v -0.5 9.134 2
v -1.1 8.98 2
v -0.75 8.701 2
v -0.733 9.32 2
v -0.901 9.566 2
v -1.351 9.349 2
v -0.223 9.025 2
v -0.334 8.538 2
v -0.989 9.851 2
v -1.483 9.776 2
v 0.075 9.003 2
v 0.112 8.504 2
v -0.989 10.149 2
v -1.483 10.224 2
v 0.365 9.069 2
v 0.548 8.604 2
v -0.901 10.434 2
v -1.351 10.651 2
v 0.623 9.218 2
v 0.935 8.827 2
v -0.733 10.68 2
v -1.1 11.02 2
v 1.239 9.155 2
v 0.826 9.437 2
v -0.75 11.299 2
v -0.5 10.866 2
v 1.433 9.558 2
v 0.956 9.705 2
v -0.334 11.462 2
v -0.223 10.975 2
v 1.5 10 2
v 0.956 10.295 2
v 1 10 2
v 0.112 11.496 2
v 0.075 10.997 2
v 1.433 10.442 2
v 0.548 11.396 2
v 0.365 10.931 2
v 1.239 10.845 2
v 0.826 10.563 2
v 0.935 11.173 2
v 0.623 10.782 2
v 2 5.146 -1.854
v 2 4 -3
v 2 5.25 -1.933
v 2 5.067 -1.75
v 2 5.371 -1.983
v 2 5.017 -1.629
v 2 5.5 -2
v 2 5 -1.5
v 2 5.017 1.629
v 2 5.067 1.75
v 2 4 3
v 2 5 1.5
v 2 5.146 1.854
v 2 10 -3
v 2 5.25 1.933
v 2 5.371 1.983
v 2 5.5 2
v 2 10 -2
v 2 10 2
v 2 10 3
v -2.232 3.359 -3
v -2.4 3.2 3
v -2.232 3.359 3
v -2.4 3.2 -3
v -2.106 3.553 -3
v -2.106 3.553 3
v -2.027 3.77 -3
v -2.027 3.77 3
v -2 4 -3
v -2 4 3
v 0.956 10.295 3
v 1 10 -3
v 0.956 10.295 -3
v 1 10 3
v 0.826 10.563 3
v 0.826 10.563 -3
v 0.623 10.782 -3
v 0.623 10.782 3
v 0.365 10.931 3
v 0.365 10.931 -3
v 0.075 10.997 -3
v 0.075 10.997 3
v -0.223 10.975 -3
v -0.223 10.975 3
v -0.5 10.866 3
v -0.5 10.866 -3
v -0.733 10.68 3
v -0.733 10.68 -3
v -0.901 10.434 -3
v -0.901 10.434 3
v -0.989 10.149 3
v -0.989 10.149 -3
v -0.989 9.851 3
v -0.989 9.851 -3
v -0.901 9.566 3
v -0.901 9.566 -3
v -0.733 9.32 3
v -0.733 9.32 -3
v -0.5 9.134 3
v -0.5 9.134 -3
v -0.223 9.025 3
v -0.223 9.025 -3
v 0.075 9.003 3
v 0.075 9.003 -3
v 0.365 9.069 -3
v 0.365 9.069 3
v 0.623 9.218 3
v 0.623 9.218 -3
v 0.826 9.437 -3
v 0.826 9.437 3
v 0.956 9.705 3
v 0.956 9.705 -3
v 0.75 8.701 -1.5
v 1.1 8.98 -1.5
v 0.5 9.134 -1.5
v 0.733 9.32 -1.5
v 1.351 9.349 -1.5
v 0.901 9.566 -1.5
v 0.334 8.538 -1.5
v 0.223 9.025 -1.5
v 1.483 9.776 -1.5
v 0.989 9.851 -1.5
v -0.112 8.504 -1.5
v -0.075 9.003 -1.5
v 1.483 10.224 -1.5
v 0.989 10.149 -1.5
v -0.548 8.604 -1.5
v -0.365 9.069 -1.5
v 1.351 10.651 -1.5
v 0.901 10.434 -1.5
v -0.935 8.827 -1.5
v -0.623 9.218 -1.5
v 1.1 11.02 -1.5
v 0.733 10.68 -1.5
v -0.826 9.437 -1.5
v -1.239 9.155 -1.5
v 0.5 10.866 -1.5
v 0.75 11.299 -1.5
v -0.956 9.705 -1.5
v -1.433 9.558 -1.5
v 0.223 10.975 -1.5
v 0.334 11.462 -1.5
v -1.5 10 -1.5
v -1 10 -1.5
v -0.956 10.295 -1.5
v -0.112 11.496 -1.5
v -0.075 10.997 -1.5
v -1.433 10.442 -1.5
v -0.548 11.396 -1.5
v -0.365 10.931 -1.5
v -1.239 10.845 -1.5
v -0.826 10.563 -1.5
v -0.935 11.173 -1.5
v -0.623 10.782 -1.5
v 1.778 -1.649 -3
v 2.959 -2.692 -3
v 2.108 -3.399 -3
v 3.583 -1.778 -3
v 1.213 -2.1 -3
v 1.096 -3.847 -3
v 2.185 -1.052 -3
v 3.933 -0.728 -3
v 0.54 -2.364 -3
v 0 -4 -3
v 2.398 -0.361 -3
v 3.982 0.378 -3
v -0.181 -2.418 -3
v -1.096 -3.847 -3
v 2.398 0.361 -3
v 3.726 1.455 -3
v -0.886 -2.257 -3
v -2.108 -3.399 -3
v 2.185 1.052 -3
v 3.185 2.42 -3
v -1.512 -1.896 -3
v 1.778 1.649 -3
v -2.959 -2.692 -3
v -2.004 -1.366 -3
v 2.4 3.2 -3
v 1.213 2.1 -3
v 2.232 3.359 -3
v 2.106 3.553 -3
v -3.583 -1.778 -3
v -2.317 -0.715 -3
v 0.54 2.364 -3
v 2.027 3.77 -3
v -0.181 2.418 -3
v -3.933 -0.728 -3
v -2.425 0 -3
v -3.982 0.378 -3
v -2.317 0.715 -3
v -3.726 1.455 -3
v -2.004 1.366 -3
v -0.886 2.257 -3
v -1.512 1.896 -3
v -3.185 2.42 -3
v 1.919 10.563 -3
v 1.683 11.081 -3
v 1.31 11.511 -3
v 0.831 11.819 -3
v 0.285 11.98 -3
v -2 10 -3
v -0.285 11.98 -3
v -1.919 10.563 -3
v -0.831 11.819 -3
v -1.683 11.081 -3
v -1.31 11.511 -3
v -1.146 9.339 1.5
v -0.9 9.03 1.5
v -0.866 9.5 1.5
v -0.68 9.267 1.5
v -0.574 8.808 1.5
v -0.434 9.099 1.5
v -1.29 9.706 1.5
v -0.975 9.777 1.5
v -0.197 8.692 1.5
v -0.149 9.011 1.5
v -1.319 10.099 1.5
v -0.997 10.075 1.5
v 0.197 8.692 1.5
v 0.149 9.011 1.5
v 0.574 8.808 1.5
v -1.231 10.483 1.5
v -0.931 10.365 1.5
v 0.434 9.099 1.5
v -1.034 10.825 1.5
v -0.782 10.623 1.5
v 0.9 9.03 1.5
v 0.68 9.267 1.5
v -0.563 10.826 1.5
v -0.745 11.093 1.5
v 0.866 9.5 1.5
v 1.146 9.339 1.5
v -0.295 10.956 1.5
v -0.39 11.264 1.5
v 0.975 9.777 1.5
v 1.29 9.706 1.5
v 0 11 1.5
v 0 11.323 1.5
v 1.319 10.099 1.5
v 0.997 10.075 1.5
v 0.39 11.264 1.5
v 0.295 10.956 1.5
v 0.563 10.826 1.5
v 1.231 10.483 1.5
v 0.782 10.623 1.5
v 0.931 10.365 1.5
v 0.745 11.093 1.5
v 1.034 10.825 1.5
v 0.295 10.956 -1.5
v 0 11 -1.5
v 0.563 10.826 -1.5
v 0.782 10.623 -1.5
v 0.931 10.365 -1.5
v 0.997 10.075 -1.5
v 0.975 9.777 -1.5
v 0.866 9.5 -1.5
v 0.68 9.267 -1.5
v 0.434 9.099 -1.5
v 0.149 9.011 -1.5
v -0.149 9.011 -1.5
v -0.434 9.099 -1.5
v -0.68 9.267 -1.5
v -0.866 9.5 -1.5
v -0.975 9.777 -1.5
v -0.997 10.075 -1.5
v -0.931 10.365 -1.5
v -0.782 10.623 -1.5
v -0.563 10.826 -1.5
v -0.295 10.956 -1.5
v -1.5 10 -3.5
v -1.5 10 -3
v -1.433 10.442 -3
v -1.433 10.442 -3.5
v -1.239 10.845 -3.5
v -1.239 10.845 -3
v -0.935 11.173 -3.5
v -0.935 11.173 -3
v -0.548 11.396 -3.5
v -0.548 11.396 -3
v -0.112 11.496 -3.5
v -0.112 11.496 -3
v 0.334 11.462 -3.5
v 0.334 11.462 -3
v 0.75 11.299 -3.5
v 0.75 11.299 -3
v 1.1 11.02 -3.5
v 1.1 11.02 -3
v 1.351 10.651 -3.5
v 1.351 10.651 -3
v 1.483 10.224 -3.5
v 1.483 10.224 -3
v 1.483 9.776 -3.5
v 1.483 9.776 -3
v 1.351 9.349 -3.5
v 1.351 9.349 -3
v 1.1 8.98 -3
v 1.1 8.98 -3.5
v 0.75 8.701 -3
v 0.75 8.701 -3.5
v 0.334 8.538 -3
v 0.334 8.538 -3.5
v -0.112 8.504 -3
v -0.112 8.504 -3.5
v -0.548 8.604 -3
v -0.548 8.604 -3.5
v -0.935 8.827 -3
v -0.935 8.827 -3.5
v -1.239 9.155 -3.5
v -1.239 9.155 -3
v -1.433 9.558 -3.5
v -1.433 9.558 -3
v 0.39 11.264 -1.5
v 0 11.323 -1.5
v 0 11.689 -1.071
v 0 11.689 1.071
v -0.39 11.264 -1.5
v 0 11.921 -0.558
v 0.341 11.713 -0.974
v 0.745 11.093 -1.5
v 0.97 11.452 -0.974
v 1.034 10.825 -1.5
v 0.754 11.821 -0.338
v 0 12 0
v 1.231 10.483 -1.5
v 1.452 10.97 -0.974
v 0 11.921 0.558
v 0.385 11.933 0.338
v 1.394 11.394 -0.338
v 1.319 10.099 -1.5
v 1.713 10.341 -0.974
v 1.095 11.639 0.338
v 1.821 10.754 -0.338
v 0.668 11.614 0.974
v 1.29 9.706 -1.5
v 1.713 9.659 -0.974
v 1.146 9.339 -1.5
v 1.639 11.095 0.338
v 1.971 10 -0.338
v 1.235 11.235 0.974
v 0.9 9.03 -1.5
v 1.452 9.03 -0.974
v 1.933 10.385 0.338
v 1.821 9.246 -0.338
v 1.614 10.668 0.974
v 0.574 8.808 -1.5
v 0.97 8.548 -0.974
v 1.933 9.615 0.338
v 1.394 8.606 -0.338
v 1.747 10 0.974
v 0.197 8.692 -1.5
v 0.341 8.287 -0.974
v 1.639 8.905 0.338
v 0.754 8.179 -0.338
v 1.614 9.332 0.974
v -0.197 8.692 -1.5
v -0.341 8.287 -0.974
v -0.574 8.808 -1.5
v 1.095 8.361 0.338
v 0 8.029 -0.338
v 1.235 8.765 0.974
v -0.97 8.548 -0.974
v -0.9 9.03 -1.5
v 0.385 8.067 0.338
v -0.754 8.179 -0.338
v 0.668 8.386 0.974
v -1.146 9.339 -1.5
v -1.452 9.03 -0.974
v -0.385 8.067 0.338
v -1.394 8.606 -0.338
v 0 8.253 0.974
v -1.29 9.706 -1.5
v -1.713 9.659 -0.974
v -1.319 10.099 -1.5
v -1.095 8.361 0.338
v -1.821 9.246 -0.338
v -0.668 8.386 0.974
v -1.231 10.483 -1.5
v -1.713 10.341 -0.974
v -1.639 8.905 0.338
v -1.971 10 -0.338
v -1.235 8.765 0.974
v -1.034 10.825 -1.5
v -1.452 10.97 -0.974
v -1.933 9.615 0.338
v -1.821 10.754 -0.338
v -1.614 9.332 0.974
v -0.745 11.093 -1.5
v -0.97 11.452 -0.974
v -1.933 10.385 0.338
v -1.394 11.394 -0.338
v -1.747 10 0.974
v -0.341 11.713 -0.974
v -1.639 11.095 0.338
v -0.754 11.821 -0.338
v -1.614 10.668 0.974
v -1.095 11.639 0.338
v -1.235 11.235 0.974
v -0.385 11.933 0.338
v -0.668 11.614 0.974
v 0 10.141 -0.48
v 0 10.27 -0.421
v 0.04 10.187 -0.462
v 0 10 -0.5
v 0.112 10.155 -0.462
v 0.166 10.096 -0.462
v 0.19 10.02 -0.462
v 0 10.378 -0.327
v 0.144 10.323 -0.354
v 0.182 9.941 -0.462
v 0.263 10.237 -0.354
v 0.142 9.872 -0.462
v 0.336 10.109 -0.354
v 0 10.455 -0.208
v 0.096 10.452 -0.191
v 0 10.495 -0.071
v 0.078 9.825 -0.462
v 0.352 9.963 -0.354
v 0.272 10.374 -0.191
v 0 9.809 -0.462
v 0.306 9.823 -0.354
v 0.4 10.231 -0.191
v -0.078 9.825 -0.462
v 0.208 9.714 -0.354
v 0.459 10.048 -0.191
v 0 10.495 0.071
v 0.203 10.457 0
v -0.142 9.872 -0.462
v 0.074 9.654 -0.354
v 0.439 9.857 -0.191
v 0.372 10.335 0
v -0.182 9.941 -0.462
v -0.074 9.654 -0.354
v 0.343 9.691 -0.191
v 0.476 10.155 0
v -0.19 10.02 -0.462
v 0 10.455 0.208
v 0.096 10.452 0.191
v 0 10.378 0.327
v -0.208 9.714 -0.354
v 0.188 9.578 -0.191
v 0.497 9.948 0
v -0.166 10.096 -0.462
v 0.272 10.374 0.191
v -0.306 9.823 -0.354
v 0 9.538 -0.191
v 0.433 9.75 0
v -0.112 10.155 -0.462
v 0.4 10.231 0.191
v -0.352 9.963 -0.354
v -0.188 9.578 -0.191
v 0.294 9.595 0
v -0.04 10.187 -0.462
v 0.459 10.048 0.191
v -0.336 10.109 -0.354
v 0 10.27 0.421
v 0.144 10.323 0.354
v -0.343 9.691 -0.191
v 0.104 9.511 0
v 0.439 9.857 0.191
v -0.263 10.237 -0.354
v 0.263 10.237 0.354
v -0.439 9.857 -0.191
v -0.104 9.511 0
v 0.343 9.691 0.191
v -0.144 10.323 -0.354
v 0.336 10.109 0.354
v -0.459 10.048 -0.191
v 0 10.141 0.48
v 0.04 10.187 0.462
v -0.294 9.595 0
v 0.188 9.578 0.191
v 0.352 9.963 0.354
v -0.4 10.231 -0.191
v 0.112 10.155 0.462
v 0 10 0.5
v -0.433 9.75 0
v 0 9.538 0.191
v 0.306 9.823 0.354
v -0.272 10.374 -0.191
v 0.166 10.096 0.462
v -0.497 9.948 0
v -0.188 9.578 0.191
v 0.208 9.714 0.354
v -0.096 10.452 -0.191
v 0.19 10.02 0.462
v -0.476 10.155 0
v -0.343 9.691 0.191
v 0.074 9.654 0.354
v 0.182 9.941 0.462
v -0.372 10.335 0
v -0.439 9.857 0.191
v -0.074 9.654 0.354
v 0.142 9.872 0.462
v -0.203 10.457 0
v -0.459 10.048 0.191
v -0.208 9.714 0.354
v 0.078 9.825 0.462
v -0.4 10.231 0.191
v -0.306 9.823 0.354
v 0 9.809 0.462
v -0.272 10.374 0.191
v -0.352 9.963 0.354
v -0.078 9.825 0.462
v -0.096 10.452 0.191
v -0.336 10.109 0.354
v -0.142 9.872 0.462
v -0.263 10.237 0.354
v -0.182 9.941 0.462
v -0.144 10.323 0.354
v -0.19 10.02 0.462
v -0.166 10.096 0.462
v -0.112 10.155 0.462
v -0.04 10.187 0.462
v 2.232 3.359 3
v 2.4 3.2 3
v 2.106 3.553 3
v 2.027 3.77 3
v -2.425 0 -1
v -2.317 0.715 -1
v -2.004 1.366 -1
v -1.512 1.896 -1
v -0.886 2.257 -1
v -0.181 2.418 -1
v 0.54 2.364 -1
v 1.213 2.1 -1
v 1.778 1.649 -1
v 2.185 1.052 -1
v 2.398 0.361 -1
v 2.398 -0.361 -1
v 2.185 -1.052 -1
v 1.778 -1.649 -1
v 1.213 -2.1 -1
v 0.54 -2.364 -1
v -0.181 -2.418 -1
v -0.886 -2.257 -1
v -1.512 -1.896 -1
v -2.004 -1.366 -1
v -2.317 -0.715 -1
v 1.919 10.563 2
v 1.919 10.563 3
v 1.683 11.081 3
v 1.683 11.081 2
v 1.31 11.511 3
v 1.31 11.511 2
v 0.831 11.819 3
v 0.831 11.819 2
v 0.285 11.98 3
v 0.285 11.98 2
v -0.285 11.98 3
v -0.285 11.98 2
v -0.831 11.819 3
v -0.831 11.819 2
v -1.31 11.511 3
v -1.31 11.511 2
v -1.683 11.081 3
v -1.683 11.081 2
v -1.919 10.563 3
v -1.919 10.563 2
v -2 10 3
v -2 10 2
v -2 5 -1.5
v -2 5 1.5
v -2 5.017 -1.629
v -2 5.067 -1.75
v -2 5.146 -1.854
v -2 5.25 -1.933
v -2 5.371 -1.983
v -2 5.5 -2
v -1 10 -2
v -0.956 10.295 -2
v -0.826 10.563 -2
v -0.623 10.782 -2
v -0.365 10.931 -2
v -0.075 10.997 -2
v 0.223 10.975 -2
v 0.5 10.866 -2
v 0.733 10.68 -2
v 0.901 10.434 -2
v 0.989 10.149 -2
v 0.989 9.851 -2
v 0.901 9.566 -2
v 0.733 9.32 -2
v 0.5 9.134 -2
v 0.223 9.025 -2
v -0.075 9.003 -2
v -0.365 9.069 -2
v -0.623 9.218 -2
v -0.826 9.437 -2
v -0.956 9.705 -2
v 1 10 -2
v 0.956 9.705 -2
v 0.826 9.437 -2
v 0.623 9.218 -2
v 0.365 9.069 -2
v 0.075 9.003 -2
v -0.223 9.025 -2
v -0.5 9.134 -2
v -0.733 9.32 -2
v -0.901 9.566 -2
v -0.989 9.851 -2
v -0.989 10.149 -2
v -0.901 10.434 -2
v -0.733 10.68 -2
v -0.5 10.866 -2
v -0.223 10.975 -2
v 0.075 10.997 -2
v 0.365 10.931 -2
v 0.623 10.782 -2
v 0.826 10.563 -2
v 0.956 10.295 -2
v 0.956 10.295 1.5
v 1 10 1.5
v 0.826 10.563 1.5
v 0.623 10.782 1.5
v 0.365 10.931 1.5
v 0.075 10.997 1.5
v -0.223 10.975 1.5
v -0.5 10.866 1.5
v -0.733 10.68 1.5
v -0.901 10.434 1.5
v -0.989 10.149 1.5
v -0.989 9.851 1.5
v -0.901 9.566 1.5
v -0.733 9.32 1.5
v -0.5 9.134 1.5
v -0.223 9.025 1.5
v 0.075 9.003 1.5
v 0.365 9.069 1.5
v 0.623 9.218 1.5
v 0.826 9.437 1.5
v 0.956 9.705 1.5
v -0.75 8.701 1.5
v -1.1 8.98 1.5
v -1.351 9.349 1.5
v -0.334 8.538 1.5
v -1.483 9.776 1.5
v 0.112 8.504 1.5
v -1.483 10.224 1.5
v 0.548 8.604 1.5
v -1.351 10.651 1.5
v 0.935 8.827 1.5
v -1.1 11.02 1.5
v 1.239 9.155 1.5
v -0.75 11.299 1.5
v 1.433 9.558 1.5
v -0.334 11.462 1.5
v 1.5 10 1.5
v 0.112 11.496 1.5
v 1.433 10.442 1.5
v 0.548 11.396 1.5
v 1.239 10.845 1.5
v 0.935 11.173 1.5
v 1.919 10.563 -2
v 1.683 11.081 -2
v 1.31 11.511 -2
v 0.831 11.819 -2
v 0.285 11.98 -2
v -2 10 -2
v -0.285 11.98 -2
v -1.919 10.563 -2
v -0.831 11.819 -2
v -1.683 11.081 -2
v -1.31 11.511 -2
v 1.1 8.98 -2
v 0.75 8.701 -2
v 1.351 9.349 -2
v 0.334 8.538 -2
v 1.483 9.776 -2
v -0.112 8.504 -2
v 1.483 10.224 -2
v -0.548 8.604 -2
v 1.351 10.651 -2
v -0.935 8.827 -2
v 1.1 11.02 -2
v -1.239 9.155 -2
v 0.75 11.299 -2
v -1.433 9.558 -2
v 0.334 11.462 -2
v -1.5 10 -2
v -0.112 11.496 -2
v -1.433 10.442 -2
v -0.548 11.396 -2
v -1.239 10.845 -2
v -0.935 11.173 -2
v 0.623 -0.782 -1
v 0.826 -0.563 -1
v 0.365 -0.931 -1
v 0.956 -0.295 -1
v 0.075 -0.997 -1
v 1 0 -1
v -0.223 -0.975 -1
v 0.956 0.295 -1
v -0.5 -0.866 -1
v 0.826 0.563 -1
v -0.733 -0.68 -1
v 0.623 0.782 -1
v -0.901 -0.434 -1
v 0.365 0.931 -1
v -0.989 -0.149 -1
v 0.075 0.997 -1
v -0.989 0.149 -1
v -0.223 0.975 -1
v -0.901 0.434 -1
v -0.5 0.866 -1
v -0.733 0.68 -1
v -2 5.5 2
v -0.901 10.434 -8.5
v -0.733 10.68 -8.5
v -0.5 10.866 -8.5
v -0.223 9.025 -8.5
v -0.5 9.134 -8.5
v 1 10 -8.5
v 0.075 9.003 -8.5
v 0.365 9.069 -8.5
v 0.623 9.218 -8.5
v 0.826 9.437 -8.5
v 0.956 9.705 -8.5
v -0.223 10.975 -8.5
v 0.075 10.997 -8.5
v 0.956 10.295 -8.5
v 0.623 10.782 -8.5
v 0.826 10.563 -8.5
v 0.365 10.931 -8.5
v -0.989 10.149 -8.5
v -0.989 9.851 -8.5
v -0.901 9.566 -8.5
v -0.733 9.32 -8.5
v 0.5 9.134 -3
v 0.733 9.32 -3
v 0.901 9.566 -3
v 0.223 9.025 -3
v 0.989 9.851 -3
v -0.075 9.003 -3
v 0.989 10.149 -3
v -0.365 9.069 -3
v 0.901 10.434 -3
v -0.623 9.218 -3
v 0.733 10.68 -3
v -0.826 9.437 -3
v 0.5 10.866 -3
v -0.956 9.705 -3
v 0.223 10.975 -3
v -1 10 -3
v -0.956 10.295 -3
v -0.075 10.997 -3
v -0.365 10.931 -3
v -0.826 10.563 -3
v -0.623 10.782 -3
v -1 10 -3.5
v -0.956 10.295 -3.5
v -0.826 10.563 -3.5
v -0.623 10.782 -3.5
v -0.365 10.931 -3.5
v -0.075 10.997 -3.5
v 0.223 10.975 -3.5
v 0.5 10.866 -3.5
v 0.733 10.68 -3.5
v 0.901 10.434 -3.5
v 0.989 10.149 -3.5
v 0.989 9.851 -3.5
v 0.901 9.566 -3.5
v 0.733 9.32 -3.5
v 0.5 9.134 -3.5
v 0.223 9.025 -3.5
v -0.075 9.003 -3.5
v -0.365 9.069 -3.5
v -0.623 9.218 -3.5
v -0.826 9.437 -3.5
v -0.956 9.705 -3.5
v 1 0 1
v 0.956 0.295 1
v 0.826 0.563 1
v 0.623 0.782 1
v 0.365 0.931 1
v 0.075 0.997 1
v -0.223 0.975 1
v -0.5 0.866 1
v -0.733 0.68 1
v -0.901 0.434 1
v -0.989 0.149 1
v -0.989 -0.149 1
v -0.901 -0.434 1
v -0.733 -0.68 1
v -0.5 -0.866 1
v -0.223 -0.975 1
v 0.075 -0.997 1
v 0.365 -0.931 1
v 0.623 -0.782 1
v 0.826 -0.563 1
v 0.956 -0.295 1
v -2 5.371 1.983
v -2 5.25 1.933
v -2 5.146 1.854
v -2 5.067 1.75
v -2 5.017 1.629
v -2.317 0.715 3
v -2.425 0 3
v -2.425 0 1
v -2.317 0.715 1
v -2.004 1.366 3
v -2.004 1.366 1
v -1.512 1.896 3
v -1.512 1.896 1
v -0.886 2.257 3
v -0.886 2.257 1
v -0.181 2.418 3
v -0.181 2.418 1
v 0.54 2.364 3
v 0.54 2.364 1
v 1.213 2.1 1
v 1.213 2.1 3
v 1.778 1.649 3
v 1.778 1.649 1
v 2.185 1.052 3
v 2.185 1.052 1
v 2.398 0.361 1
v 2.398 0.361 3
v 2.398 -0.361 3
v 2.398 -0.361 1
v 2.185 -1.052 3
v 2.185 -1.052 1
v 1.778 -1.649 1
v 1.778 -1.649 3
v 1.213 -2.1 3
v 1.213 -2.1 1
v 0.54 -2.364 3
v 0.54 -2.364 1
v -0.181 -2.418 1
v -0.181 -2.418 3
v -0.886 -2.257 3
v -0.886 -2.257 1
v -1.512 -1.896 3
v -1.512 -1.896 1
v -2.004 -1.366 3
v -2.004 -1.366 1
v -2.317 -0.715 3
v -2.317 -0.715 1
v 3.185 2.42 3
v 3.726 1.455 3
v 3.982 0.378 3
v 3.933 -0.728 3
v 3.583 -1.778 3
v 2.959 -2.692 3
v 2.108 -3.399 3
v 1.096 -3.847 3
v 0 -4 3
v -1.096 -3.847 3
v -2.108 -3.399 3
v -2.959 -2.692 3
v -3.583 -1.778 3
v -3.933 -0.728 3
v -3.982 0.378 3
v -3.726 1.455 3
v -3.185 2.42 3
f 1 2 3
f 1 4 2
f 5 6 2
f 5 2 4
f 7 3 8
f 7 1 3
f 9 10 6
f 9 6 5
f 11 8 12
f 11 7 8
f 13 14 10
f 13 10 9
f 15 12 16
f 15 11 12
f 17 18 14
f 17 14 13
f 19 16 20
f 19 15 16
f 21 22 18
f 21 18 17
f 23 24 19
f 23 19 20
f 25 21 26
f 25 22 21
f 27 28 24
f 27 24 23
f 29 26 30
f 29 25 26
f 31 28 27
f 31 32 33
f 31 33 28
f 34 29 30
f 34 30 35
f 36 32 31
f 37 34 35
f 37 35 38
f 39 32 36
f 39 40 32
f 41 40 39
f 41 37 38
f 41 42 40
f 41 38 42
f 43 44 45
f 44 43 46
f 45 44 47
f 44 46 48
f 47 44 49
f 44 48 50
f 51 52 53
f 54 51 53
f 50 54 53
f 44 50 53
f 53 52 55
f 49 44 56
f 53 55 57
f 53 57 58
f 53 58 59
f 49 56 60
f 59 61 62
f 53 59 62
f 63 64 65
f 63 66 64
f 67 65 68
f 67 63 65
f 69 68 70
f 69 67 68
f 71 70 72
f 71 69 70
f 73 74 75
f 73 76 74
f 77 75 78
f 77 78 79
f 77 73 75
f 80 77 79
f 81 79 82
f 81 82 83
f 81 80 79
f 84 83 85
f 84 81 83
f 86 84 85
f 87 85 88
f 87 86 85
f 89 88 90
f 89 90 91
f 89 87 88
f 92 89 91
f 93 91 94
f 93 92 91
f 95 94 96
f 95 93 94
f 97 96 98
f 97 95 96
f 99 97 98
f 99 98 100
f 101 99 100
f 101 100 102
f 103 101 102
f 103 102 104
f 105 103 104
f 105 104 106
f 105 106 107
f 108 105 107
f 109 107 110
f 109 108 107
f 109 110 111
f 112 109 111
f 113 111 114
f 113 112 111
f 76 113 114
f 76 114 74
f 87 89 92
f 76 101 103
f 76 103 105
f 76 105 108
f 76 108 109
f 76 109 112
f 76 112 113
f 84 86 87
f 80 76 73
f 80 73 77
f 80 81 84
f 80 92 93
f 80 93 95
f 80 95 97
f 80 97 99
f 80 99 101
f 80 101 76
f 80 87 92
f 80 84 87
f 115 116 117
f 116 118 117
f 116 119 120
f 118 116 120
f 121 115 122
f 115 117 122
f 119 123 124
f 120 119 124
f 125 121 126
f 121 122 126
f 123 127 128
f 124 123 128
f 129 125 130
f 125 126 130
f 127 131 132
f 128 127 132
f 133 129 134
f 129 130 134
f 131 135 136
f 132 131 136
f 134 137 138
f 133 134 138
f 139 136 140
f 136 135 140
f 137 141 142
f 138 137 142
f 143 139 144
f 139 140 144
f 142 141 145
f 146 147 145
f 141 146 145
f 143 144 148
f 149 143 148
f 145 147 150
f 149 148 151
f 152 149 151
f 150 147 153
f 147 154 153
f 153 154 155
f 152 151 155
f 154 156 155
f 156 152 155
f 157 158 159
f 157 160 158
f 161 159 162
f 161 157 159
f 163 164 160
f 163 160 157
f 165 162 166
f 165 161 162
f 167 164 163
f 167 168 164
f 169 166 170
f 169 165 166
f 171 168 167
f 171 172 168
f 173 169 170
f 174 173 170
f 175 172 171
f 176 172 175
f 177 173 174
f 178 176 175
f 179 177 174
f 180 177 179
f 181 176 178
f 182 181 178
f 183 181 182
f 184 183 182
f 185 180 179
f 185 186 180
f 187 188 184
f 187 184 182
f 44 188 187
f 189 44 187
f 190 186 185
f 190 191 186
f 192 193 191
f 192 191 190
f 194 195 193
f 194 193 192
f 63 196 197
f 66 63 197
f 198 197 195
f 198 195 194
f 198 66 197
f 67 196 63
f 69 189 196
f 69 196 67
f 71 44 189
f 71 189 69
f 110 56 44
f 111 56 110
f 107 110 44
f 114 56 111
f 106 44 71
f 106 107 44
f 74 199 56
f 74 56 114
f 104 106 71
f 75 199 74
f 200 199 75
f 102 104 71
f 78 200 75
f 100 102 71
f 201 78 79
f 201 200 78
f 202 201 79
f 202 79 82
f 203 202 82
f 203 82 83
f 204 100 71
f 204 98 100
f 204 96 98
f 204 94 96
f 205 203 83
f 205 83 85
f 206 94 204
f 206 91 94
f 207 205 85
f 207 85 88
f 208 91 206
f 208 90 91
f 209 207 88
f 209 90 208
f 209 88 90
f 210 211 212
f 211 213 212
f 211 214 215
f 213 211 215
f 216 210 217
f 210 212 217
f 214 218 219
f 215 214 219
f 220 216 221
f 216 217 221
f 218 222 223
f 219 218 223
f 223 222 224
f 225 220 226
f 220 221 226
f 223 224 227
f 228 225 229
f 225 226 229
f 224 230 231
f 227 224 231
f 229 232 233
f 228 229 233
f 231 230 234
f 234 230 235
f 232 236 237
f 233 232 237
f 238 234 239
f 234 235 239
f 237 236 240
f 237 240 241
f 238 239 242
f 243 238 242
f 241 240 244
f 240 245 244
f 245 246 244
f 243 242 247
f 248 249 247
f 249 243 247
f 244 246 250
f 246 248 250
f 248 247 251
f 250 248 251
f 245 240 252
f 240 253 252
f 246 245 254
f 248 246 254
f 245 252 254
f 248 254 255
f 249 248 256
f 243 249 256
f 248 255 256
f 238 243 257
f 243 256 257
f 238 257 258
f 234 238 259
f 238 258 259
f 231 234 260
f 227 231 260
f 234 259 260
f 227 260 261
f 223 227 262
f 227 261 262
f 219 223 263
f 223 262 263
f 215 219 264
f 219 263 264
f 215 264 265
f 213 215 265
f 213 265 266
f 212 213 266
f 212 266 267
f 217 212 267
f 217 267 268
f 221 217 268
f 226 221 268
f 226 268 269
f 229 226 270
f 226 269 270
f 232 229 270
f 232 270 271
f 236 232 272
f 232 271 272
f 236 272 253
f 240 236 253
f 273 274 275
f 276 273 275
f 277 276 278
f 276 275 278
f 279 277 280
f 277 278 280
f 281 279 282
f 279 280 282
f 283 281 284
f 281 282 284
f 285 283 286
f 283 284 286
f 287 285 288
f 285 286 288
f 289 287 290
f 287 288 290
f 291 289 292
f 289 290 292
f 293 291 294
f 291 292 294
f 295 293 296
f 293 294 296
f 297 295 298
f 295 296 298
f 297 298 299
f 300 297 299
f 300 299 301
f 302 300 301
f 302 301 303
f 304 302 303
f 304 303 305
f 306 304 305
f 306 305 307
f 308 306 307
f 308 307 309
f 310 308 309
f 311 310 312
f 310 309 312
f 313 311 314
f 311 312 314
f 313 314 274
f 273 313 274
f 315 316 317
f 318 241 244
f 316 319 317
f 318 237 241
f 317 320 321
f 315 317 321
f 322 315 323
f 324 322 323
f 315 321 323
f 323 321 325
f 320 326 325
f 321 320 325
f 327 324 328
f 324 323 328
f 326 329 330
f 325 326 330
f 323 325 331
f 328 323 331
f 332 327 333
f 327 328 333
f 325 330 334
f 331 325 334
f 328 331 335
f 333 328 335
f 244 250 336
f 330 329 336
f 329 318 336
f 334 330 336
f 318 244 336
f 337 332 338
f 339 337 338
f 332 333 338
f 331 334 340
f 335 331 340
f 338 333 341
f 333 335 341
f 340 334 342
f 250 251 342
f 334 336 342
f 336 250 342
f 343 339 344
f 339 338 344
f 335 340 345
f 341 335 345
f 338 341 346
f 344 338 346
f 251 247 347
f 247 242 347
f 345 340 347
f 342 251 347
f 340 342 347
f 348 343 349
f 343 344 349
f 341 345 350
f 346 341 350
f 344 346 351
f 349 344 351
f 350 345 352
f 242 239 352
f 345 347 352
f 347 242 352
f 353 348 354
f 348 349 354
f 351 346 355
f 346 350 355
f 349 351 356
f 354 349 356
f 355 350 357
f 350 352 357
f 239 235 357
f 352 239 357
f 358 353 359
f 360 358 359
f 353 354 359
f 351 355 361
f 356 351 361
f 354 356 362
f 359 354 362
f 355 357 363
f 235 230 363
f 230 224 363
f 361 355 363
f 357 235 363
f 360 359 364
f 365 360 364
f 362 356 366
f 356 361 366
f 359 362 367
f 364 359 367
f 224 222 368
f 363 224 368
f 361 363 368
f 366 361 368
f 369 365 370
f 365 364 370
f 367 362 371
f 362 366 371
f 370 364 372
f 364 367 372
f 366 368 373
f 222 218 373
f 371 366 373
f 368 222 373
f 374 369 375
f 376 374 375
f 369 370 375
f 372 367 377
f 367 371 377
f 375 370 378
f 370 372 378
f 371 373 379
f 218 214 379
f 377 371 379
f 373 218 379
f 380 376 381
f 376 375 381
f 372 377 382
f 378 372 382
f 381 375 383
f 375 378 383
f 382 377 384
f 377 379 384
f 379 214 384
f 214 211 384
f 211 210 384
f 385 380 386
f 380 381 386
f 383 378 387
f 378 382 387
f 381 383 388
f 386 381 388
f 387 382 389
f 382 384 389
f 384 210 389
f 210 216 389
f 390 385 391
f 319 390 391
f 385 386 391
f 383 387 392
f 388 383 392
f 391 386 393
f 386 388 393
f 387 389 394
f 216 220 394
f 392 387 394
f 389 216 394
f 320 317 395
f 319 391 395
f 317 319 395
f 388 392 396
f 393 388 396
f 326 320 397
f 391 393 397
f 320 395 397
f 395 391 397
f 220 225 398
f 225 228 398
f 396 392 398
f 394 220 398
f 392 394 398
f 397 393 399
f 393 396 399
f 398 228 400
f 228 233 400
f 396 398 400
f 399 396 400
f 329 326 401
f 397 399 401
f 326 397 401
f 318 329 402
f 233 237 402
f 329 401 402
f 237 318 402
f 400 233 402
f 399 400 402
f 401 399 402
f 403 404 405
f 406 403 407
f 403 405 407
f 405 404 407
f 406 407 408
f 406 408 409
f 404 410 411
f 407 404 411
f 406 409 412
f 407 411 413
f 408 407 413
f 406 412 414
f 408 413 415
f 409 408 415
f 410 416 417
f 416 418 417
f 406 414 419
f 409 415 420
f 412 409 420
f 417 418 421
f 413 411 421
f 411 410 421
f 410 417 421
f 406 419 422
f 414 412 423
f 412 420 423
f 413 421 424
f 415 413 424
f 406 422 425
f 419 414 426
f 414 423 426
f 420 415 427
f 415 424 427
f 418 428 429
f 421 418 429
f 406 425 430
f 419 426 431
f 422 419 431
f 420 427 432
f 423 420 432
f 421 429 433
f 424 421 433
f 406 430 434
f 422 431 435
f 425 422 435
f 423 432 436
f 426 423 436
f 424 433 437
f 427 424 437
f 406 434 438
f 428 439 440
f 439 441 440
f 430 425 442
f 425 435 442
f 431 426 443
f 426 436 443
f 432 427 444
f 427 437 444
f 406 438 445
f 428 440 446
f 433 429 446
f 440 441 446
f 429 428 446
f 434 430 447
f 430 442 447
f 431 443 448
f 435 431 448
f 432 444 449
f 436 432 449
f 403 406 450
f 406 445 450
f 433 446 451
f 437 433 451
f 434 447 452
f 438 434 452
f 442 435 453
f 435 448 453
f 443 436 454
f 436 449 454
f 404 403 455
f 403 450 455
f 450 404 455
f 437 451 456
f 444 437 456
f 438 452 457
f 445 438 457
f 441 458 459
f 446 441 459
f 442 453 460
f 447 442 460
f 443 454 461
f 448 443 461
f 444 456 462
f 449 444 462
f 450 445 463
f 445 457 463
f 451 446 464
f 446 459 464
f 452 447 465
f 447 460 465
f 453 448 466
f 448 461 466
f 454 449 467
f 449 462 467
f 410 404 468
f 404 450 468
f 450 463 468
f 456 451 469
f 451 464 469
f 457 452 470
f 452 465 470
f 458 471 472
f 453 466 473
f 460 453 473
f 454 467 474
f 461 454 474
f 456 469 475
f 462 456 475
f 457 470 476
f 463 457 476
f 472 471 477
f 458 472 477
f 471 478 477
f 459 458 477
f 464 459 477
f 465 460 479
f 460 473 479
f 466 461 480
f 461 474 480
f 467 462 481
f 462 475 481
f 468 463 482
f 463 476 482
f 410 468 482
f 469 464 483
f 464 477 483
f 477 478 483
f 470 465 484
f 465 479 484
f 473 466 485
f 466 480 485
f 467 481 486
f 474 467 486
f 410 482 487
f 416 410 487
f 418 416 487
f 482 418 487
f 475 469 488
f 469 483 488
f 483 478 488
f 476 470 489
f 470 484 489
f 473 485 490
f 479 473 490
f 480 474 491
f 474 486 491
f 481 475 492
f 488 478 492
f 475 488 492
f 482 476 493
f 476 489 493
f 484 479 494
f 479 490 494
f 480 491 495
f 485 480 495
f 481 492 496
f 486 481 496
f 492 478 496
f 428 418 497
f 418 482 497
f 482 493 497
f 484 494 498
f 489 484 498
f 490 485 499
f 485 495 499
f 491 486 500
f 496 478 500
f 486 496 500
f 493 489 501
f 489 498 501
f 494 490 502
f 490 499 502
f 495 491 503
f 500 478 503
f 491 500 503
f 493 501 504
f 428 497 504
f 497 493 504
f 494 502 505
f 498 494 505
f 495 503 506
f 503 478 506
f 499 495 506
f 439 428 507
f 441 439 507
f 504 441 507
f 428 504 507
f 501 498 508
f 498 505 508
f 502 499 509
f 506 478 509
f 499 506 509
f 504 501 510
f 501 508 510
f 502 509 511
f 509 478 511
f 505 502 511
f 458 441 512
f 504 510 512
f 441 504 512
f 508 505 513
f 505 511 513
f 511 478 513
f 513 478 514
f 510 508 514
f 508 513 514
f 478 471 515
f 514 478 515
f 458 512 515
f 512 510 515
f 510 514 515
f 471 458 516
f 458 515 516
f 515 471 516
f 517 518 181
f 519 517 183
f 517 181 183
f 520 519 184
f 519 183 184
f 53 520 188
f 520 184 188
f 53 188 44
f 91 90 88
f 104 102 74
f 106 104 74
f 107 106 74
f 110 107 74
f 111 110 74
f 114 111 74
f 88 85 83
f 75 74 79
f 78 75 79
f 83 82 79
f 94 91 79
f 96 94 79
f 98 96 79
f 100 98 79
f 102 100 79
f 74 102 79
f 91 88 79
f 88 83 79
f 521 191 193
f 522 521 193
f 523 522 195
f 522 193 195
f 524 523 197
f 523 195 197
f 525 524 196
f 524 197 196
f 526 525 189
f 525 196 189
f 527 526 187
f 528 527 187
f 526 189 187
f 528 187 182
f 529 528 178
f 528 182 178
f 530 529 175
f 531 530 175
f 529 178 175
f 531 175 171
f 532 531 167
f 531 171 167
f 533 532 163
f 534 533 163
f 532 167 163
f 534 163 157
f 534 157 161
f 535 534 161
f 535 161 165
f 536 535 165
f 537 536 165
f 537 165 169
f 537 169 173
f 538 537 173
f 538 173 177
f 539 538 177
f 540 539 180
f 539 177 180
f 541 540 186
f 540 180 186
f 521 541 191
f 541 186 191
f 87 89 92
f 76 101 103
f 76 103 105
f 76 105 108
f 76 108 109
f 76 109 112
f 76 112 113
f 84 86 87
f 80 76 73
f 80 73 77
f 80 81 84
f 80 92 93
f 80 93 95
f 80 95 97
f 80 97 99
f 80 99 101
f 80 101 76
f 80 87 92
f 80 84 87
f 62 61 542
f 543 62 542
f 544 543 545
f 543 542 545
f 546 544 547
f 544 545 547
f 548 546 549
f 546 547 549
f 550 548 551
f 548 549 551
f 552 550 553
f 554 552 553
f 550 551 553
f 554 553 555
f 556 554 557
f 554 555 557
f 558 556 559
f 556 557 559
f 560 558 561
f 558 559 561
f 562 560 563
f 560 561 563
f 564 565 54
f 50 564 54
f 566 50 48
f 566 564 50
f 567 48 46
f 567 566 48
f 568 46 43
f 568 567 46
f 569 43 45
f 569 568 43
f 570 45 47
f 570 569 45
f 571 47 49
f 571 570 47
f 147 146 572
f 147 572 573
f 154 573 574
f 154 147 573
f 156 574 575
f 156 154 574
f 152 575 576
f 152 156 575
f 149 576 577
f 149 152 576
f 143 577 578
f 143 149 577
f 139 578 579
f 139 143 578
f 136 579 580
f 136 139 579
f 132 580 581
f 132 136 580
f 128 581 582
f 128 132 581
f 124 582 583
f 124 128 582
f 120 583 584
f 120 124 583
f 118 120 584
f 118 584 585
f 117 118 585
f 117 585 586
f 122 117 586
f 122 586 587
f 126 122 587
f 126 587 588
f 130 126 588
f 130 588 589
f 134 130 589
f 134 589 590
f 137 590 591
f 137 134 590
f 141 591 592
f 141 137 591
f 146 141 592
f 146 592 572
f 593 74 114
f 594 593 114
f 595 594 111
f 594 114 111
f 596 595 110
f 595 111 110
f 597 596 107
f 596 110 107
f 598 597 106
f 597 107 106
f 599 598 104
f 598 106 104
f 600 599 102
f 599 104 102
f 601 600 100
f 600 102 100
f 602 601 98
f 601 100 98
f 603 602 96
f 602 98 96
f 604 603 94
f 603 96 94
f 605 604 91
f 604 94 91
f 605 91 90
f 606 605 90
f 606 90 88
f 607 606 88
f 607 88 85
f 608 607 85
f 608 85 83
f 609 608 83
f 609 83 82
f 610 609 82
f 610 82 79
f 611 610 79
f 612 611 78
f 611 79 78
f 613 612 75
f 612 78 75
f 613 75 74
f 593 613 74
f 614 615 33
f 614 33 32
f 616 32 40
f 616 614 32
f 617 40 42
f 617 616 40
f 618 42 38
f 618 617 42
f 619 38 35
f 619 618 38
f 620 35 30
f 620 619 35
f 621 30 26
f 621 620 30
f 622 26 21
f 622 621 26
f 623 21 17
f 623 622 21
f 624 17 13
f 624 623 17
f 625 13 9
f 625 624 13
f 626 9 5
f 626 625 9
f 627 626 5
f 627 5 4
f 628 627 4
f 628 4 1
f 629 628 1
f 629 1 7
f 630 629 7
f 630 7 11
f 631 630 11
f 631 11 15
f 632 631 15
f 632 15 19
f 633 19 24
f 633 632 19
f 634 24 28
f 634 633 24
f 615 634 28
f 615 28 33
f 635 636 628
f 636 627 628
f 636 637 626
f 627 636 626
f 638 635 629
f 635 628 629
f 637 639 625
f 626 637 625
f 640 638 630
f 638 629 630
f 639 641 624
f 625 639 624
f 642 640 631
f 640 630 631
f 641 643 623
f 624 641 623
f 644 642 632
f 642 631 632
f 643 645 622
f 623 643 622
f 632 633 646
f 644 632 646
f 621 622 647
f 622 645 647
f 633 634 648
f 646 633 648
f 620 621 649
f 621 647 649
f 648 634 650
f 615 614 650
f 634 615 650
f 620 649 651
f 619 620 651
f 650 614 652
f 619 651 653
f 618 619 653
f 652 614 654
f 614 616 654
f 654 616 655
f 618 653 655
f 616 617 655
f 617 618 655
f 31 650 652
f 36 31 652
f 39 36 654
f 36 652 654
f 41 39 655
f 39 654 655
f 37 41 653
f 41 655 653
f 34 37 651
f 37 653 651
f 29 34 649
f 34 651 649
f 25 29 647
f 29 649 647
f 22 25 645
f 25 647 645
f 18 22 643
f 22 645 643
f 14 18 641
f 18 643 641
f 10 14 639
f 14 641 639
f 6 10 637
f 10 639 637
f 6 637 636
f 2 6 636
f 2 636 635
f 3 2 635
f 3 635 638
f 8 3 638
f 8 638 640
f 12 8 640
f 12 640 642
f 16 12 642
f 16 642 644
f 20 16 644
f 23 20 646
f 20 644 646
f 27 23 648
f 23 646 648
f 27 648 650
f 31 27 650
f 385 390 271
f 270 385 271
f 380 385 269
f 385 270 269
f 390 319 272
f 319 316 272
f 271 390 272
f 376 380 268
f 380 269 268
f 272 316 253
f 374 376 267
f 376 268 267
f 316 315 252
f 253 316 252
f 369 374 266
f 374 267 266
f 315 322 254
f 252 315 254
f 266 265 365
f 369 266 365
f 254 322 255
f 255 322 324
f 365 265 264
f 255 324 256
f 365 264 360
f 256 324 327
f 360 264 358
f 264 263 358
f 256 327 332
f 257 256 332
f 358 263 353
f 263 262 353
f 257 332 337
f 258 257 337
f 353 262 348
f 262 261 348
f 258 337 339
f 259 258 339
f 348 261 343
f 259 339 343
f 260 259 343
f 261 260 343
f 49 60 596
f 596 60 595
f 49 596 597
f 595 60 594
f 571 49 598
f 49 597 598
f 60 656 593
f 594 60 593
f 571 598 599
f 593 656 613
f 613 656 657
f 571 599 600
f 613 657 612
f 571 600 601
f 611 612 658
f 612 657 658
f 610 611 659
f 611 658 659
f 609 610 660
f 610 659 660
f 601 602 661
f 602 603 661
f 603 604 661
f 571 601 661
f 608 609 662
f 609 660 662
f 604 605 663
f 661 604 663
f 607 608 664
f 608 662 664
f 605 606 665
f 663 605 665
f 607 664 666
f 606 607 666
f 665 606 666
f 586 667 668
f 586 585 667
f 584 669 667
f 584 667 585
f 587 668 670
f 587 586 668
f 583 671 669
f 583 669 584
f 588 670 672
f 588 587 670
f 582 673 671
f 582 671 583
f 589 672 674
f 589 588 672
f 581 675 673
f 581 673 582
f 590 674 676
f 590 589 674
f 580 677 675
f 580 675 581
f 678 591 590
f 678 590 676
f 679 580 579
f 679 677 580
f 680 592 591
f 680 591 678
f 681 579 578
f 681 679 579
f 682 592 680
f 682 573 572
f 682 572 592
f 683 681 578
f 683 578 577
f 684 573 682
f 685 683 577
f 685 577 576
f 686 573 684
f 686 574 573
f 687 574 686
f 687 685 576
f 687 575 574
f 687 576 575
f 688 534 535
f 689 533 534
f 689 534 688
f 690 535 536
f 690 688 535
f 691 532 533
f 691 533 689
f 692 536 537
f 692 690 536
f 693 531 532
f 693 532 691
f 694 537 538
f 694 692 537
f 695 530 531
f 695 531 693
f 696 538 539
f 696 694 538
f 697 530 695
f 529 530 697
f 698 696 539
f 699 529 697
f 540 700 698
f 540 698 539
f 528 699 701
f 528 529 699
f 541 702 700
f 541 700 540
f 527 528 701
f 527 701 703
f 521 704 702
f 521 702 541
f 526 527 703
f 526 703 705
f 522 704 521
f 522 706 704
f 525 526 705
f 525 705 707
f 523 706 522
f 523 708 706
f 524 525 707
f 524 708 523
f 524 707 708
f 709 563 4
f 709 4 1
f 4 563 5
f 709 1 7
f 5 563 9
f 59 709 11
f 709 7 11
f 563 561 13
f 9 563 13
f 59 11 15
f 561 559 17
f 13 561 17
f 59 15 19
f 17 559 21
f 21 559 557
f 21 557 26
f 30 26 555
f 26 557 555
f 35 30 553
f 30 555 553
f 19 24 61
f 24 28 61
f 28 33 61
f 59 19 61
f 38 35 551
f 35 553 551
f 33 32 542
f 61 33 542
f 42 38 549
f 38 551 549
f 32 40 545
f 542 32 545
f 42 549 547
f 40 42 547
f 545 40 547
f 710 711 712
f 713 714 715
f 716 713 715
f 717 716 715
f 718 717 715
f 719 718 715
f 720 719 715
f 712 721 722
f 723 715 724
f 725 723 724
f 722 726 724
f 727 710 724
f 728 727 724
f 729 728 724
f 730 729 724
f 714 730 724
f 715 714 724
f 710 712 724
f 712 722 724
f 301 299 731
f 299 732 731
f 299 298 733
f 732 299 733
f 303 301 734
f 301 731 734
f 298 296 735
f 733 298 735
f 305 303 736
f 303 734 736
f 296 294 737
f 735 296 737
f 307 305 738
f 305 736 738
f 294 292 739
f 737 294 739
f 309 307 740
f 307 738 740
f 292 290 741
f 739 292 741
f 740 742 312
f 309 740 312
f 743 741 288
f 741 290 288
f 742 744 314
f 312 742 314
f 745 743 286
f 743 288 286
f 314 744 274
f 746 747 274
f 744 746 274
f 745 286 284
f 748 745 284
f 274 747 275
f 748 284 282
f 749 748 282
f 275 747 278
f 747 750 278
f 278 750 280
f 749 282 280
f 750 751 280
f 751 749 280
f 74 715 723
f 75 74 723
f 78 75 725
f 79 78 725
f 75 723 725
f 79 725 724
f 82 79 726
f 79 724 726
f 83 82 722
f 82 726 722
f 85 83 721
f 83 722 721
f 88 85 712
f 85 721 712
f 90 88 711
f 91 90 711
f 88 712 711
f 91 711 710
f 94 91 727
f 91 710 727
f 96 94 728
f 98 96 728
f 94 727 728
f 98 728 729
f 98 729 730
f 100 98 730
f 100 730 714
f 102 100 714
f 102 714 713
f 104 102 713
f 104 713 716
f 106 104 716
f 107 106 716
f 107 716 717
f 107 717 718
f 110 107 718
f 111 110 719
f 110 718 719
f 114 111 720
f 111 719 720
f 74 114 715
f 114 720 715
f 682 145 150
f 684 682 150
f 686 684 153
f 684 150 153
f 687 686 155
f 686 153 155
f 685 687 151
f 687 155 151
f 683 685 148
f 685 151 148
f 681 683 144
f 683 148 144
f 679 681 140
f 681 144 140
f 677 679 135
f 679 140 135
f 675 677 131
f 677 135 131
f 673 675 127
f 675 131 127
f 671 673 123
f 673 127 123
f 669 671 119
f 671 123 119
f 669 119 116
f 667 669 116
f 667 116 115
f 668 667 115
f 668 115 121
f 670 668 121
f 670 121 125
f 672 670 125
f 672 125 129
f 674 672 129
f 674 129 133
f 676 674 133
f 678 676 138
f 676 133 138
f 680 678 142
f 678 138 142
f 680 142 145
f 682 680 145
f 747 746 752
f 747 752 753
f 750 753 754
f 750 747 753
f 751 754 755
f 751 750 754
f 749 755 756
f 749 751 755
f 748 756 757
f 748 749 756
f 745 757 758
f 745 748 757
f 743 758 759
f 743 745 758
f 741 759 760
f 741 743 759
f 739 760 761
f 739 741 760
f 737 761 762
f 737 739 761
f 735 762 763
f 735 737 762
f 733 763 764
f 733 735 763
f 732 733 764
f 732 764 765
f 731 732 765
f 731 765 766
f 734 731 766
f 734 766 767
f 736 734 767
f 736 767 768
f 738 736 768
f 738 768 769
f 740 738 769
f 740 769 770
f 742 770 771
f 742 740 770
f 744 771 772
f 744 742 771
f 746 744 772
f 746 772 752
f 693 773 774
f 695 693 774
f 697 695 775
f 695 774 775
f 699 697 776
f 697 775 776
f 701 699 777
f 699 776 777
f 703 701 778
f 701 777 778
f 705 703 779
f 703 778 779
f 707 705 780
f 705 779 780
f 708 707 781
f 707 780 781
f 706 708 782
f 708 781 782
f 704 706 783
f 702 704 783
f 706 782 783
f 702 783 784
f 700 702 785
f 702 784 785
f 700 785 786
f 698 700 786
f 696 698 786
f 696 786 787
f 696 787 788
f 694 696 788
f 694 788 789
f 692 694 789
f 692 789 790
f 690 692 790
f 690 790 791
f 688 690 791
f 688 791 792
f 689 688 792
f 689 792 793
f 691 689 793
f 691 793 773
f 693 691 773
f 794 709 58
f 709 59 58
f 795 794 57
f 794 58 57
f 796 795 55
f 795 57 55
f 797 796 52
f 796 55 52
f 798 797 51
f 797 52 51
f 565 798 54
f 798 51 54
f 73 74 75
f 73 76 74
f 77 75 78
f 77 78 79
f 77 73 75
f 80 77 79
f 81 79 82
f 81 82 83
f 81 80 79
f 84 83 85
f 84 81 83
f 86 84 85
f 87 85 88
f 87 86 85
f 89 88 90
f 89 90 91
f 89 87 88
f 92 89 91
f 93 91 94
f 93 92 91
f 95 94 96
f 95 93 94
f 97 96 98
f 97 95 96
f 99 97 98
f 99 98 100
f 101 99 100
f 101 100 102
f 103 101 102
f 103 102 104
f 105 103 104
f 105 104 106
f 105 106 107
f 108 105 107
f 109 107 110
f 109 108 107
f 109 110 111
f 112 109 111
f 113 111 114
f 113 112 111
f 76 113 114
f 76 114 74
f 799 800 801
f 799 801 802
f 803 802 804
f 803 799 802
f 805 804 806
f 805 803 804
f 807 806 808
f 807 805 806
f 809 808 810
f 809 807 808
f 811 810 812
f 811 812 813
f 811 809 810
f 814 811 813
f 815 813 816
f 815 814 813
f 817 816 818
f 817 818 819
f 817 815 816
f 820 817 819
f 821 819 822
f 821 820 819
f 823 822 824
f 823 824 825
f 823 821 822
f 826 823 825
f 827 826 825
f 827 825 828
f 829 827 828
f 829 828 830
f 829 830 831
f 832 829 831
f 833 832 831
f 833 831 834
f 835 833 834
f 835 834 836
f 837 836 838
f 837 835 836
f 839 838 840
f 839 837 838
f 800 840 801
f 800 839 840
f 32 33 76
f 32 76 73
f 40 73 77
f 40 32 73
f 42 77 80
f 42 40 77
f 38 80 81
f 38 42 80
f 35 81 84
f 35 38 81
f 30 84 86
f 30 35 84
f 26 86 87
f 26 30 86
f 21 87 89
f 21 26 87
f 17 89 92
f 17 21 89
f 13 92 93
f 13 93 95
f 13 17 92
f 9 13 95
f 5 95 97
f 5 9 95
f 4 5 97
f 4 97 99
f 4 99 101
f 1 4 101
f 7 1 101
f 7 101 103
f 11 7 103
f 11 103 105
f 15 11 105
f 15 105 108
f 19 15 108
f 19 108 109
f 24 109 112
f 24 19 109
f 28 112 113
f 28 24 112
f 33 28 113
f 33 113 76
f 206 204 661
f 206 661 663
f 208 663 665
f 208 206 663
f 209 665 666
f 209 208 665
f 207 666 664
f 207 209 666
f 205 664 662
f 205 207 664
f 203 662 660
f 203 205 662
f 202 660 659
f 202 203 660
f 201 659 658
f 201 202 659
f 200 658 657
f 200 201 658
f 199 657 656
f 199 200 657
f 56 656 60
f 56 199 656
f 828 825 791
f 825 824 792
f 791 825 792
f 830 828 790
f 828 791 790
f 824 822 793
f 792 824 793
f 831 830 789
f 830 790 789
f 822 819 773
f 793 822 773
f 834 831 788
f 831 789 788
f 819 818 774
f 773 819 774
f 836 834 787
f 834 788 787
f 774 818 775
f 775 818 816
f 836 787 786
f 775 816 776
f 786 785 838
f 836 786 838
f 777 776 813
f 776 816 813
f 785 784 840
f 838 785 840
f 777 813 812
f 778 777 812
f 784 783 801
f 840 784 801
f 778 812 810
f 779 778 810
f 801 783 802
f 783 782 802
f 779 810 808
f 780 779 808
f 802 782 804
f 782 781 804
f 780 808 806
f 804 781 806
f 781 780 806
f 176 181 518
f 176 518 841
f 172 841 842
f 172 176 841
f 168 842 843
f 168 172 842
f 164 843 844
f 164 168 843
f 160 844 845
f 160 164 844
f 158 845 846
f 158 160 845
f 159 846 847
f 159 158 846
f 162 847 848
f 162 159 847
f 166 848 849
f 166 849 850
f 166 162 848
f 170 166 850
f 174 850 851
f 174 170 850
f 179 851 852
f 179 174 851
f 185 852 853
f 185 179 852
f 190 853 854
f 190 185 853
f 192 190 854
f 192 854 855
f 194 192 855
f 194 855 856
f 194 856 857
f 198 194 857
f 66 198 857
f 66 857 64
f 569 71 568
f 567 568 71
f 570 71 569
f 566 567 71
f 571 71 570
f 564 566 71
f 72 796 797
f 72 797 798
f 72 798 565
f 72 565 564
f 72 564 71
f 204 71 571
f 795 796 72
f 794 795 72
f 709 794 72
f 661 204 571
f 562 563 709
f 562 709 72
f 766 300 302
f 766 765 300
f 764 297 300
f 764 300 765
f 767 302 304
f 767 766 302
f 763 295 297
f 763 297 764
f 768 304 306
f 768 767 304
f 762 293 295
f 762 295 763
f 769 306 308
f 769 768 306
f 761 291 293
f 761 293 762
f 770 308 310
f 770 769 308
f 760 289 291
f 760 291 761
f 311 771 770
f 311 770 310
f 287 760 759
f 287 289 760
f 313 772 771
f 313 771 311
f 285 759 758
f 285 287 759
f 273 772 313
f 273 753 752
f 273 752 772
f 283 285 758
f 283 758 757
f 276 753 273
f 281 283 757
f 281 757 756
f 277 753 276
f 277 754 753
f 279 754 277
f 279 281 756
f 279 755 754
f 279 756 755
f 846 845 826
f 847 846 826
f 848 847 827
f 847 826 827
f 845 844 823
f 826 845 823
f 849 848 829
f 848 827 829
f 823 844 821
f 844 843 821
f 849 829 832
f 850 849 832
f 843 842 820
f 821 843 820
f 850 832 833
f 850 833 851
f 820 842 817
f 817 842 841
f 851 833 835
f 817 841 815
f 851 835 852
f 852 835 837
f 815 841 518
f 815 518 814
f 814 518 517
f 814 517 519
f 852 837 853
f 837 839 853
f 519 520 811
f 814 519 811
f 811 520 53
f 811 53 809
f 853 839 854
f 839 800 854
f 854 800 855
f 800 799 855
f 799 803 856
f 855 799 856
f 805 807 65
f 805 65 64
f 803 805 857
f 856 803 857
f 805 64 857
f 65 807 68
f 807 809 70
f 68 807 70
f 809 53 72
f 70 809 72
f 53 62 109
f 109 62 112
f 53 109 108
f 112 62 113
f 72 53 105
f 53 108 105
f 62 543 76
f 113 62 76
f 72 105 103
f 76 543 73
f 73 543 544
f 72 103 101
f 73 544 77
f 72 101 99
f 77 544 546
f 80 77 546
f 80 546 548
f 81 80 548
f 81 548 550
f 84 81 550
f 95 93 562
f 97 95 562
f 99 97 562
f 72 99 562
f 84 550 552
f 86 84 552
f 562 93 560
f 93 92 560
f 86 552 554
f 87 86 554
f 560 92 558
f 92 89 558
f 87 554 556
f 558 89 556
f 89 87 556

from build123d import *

# Parameters (mm, degrees)
SKETCH_1_R            = 1
EXTRUDE_1_DEPTH       = 3
SKETCH_1_R_2          = 2
EXTRUDE_1_2_DEPTH     = 3
EXTRUDE_START         = 2
SKETCH_2_R            = 1
EXTRUDE_2_DEPTH       = 1
SKETCH_3_R            = 1
EXTRUDE_3_DEPTH       = 1
EXTRUDE_4_REACH       = 9.874
EXTRUDE_4_END_RADIUS  = 2
SKETCH_4_W            = 4
SKETCH_4_H            = 6
SKETCH_6_R            = 4
EXTRUDE_5_DEPTH       = 6
SKETCH_7_R            = 2.425
CUT_EXTRUDE_2_DEPTH   = 2
SKETCH_8_R            = 1
CUT_EXTRUDE_3_DEPTH   = 14.266499161
FILLET_3_R            = 1
FILLET_2_R            = 0.5
SKETCH_9_R            = 1
EXTRUDE_6_DEPTH       = 3
SKETCH_11_R           = 1.5
SKETCH_11_R_2         = 1
EXTRUDE_7_DEPTH       = 0.5
SKETCH_12_R           = 1.5
SKETCH_12_R_2         = 1
EXTRUDE_8_DEPTH       = 0.5
MOVE_START            = -8.5
MOVE_FACE_1_OUTLINE_R = 1
MOVE_FACE_1_DEPTH     = 5.5


# Read off the part's stored shape, not the designer's step: 移动面1
with BuildPart() as part:
    # 草图1 → 凸台-拉伸1 (new, symmetric)
    with BuildSketch(Plane.XY):
        with Locations((0, 10)):
            Circle(SKETCH_1_R)
    extrude(amount=EXTRUDE_1_DEPTH, both=True)


with BuildPart() as body_2:
    # 草图1 → Extrude 1 2 (new, symmetric)
    with BuildSketch(Plane.XY):
        Circle(SKETCH_1_R_2)
        Circle(SKETCH_1_R, mode=Mode.SUBTRACT)
    extrude(amount=EXTRUDE_1_2_DEPTH, both=True)



with BuildPart() as body_3:
    # 草图2 → 凸台-拉伸2 (new body)
    with BuildSketch(Plane.XY.offset(EXTRUDE_START)):
        with BuildLine():
            Line((-2, 10), (-2, 5))
            Line((-2, 5), (2, 5))
            Line((2, 5), (2, 10))
            ThreePointArc((2, 10), (0, 12), (-2, 10))
        make_face()
        with Locations((0, 10)):
            Circle(SKETCH_2_R, mode=Mode.SUBTRACT)
    extrude(amount=EXTRUDE_2_DEPTH)



with BuildPart() as body_4:
    # 草图3 → 凸台-拉伸3 (new body)
    with BuildSketch(Plane(origin=(0, 0, -3), x_dir=(-1, 0, 0), z_dir=(0, 0, -1))):
        with BuildLine():
            Line((2, 5), (2, 10))
            ThreePointArc((2, 10), (0, 12), (-2, 10))
            Line((-2, 10), (-2, 5))
            Line((-2, 5), (2, 5))
        make_face()
        with Locations(Location((0, 10, 0), (0, 0, 180))):
            Circle(SKETCH_3_R, mode=Mode.SUBTRACT)
    extrude(amount=-EXTRUDE_3_DEPTH)


with BuildPart() as body_3_1:
    add(body_3.part)

    add(body_4.part)  # 凸台-拉伸4 merges body 4
    # 凸台-拉伸4: up to this cylinder (the profile starts outside it)
    extrude_4_end = Plane(origin=(0, 0, 0), z_dir=(0, 0, -1)) * Cylinder(EXTRUDE_4_END_RADIUS, 24.748, mode=Mode.PRIVATE)
    # 草图4 → 凸台-拉伸4 (add, up to the surface)
    with BuildSketch(Plane.XZ.offset(-5), mode=Mode.PRIVATE) as extrude_4_sk1:
        Rectangle(SKETCH_4_W, SKETCH_4_H)
    extrude_4_tool1 = extrude(extrude_4_sk1.sketch, amount=EXTRUDE_4_REACH, mode=Mode.PRIVATE) - extrude_4_end
    add(extrude_4_tool1.solids().sort_by_distance((0, 5, 0))[0])


with BuildPart() as body_4_2:
    # 草图5 → 旋转1 (revolve)
    with BuildSketch(Plane(origin=(0, 0, 0), x_dir=(0, 0, -1), z_dir=(1, 0, 0))):
        with BuildLine():
            Line((-0.5, 10), (0.5, 10))
            ThreePointArc((0.5, 10), (0, 10.5), (-0.5, 10))
        make_face()
    revolve(axis=Axis((0, 10, 2), (0, 0, -1)))


with BuildPart() as body_2_1:
    add(body_2.part)

    add(body_3_1.part)  # 凸台-拉伸5 merges body 3
    # 草图6 → 凸台-拉伸5 (add)
    with BuildSketch(Plane(origin=(0, 0, -3), x_dir=(-1, 0, 0), z_dir=(0, 0, -1))):
        Circle(SKETCH_6_R)
    extrude(amount=-EXTRUDE_5_DEPTH)

    # 草图7 → 切除-拉伸2 (cut)
    with BuildSketch(Plane(origin=(0, 0, 3), x_dir=(-1, 0, 0), z_dir=(0, 0, -1))):
        Circle(SKETCH_7_R)
    cut_extrude_2 = extrude(amount=CUT_EXTRUDE_2_DEPTH, mode=Mode.SUBTRACT)

    # 镜向1: 切除-拉伸2 across plane
    add(cut_extrude_2.mirror(Plane.XY), mode=Mode.SUBTRACT)

    # 草图8 → 切除-拉伸3 (cut, through all)
    with BuildSketch(Plane.XY.offset(1)):
        Circle(SKETCH_8_R)
    extrude(amount=-CUT_EXTRUDE_3_DEPTH, mode=Mode.SUBTRACT)

    # 圆角3
    fillet_3_edges = [body_2_1.edges().sort_by_distance(p)[0] for p in [
        (-2, 3.464101615, 0),
        (2, 3.464101615, 0),
    ]]
    fillet(fillet_3_edges, radius=FILLET_3_R)

    # 圆角2
    fillet_2_edges = [body_2_1.edges().sort_by_distance(p)[0] for p in [
        (0, 5, -2),
        (0, 5, 2),
    ]]
    fillet(fillet_2_edges, radius=FILLET_2_R)


with BuildPart() as body_4_3:
    # 草图9 → 凸台-拉伸6 (new, symmetric)
    with BuildSketch(Plane.XY):
        with Locations((0, 10)):
            Circle(SKETCH_9_R)
    extrude(amount=EXTRUDE_6_DEPTH, both=True)

    # Move Face 1 outline → Move Face 1 (add)
    with BuildSketch(Plane.XY.offset(MOVE_START)):
        with Locations((0, 10)):
            Circle(MOVE_FACE_1_OUTLINE_R)
    extrude(amount=MOVE_FACE_1_DEPTH)


with BuildPart() as body_5:
    # 草图10 → 旋转2 (revolve)
    with BuildSketch(Plane(origin=(0, 0, 0), x_dir=(0, 0, -1), z_dir=(1, 0, 0))):
        with BuildLine():
            ThreePointArc((1.5, 11.322875656), (0, 12), (-1.5, 11.322875656))
            Line((-1.5, 11.322875656), (-1.5, 11))
            Line((-1.5, 11), (1.5, 11))
            Line((1.5, 11), (1.5, 11.322875656))
        make_face()
    revolve(axis=Axis((0, 10, 3), (0, 0, -1)))


with BuildPart() as body_6:
    # 草图11 → 凸台-拉伸7 (new body)
    with BuildSketch(Plane.XY.offset(1.5)):
        with Locations((0, 10)):
            Circle(SKETCH_11_R)
        with Locations((0, 10)):
            Circle(SKETCH_11_R_2, mode=Mode.SUBTRACT)
    extrude(amount=EXTRUDE_7_DEPTH)


with BuildPart() as body_7:
    # 草图12 → 凸台-拉伸8 (new body)
    with BuildSketch(Plane(origin=(0, 0, -1.5), x_dir=(-1, 0, 0), z_dir=(0, 0, -1))):
        with Locations((0, 10)):
            Circle(SKETCH_12_R)
        with Locations((0, 10)):
            Circle(SKETCH_12_R_2, mode=Mode.SUBTRACT)
    extrude(amount=EXTRUDE_8_DEPTH)


with BuildPart() as body_8:
    # Move Body 1: copy of body 7
    add(body_7.part.moved(Location((0, 0, -1.5))))


solid = Compound([part.part, body_4_2.part, body_2_1.part, body_4_3.part, body_5.part, body_6.part, body_7.part, body_8.part])
